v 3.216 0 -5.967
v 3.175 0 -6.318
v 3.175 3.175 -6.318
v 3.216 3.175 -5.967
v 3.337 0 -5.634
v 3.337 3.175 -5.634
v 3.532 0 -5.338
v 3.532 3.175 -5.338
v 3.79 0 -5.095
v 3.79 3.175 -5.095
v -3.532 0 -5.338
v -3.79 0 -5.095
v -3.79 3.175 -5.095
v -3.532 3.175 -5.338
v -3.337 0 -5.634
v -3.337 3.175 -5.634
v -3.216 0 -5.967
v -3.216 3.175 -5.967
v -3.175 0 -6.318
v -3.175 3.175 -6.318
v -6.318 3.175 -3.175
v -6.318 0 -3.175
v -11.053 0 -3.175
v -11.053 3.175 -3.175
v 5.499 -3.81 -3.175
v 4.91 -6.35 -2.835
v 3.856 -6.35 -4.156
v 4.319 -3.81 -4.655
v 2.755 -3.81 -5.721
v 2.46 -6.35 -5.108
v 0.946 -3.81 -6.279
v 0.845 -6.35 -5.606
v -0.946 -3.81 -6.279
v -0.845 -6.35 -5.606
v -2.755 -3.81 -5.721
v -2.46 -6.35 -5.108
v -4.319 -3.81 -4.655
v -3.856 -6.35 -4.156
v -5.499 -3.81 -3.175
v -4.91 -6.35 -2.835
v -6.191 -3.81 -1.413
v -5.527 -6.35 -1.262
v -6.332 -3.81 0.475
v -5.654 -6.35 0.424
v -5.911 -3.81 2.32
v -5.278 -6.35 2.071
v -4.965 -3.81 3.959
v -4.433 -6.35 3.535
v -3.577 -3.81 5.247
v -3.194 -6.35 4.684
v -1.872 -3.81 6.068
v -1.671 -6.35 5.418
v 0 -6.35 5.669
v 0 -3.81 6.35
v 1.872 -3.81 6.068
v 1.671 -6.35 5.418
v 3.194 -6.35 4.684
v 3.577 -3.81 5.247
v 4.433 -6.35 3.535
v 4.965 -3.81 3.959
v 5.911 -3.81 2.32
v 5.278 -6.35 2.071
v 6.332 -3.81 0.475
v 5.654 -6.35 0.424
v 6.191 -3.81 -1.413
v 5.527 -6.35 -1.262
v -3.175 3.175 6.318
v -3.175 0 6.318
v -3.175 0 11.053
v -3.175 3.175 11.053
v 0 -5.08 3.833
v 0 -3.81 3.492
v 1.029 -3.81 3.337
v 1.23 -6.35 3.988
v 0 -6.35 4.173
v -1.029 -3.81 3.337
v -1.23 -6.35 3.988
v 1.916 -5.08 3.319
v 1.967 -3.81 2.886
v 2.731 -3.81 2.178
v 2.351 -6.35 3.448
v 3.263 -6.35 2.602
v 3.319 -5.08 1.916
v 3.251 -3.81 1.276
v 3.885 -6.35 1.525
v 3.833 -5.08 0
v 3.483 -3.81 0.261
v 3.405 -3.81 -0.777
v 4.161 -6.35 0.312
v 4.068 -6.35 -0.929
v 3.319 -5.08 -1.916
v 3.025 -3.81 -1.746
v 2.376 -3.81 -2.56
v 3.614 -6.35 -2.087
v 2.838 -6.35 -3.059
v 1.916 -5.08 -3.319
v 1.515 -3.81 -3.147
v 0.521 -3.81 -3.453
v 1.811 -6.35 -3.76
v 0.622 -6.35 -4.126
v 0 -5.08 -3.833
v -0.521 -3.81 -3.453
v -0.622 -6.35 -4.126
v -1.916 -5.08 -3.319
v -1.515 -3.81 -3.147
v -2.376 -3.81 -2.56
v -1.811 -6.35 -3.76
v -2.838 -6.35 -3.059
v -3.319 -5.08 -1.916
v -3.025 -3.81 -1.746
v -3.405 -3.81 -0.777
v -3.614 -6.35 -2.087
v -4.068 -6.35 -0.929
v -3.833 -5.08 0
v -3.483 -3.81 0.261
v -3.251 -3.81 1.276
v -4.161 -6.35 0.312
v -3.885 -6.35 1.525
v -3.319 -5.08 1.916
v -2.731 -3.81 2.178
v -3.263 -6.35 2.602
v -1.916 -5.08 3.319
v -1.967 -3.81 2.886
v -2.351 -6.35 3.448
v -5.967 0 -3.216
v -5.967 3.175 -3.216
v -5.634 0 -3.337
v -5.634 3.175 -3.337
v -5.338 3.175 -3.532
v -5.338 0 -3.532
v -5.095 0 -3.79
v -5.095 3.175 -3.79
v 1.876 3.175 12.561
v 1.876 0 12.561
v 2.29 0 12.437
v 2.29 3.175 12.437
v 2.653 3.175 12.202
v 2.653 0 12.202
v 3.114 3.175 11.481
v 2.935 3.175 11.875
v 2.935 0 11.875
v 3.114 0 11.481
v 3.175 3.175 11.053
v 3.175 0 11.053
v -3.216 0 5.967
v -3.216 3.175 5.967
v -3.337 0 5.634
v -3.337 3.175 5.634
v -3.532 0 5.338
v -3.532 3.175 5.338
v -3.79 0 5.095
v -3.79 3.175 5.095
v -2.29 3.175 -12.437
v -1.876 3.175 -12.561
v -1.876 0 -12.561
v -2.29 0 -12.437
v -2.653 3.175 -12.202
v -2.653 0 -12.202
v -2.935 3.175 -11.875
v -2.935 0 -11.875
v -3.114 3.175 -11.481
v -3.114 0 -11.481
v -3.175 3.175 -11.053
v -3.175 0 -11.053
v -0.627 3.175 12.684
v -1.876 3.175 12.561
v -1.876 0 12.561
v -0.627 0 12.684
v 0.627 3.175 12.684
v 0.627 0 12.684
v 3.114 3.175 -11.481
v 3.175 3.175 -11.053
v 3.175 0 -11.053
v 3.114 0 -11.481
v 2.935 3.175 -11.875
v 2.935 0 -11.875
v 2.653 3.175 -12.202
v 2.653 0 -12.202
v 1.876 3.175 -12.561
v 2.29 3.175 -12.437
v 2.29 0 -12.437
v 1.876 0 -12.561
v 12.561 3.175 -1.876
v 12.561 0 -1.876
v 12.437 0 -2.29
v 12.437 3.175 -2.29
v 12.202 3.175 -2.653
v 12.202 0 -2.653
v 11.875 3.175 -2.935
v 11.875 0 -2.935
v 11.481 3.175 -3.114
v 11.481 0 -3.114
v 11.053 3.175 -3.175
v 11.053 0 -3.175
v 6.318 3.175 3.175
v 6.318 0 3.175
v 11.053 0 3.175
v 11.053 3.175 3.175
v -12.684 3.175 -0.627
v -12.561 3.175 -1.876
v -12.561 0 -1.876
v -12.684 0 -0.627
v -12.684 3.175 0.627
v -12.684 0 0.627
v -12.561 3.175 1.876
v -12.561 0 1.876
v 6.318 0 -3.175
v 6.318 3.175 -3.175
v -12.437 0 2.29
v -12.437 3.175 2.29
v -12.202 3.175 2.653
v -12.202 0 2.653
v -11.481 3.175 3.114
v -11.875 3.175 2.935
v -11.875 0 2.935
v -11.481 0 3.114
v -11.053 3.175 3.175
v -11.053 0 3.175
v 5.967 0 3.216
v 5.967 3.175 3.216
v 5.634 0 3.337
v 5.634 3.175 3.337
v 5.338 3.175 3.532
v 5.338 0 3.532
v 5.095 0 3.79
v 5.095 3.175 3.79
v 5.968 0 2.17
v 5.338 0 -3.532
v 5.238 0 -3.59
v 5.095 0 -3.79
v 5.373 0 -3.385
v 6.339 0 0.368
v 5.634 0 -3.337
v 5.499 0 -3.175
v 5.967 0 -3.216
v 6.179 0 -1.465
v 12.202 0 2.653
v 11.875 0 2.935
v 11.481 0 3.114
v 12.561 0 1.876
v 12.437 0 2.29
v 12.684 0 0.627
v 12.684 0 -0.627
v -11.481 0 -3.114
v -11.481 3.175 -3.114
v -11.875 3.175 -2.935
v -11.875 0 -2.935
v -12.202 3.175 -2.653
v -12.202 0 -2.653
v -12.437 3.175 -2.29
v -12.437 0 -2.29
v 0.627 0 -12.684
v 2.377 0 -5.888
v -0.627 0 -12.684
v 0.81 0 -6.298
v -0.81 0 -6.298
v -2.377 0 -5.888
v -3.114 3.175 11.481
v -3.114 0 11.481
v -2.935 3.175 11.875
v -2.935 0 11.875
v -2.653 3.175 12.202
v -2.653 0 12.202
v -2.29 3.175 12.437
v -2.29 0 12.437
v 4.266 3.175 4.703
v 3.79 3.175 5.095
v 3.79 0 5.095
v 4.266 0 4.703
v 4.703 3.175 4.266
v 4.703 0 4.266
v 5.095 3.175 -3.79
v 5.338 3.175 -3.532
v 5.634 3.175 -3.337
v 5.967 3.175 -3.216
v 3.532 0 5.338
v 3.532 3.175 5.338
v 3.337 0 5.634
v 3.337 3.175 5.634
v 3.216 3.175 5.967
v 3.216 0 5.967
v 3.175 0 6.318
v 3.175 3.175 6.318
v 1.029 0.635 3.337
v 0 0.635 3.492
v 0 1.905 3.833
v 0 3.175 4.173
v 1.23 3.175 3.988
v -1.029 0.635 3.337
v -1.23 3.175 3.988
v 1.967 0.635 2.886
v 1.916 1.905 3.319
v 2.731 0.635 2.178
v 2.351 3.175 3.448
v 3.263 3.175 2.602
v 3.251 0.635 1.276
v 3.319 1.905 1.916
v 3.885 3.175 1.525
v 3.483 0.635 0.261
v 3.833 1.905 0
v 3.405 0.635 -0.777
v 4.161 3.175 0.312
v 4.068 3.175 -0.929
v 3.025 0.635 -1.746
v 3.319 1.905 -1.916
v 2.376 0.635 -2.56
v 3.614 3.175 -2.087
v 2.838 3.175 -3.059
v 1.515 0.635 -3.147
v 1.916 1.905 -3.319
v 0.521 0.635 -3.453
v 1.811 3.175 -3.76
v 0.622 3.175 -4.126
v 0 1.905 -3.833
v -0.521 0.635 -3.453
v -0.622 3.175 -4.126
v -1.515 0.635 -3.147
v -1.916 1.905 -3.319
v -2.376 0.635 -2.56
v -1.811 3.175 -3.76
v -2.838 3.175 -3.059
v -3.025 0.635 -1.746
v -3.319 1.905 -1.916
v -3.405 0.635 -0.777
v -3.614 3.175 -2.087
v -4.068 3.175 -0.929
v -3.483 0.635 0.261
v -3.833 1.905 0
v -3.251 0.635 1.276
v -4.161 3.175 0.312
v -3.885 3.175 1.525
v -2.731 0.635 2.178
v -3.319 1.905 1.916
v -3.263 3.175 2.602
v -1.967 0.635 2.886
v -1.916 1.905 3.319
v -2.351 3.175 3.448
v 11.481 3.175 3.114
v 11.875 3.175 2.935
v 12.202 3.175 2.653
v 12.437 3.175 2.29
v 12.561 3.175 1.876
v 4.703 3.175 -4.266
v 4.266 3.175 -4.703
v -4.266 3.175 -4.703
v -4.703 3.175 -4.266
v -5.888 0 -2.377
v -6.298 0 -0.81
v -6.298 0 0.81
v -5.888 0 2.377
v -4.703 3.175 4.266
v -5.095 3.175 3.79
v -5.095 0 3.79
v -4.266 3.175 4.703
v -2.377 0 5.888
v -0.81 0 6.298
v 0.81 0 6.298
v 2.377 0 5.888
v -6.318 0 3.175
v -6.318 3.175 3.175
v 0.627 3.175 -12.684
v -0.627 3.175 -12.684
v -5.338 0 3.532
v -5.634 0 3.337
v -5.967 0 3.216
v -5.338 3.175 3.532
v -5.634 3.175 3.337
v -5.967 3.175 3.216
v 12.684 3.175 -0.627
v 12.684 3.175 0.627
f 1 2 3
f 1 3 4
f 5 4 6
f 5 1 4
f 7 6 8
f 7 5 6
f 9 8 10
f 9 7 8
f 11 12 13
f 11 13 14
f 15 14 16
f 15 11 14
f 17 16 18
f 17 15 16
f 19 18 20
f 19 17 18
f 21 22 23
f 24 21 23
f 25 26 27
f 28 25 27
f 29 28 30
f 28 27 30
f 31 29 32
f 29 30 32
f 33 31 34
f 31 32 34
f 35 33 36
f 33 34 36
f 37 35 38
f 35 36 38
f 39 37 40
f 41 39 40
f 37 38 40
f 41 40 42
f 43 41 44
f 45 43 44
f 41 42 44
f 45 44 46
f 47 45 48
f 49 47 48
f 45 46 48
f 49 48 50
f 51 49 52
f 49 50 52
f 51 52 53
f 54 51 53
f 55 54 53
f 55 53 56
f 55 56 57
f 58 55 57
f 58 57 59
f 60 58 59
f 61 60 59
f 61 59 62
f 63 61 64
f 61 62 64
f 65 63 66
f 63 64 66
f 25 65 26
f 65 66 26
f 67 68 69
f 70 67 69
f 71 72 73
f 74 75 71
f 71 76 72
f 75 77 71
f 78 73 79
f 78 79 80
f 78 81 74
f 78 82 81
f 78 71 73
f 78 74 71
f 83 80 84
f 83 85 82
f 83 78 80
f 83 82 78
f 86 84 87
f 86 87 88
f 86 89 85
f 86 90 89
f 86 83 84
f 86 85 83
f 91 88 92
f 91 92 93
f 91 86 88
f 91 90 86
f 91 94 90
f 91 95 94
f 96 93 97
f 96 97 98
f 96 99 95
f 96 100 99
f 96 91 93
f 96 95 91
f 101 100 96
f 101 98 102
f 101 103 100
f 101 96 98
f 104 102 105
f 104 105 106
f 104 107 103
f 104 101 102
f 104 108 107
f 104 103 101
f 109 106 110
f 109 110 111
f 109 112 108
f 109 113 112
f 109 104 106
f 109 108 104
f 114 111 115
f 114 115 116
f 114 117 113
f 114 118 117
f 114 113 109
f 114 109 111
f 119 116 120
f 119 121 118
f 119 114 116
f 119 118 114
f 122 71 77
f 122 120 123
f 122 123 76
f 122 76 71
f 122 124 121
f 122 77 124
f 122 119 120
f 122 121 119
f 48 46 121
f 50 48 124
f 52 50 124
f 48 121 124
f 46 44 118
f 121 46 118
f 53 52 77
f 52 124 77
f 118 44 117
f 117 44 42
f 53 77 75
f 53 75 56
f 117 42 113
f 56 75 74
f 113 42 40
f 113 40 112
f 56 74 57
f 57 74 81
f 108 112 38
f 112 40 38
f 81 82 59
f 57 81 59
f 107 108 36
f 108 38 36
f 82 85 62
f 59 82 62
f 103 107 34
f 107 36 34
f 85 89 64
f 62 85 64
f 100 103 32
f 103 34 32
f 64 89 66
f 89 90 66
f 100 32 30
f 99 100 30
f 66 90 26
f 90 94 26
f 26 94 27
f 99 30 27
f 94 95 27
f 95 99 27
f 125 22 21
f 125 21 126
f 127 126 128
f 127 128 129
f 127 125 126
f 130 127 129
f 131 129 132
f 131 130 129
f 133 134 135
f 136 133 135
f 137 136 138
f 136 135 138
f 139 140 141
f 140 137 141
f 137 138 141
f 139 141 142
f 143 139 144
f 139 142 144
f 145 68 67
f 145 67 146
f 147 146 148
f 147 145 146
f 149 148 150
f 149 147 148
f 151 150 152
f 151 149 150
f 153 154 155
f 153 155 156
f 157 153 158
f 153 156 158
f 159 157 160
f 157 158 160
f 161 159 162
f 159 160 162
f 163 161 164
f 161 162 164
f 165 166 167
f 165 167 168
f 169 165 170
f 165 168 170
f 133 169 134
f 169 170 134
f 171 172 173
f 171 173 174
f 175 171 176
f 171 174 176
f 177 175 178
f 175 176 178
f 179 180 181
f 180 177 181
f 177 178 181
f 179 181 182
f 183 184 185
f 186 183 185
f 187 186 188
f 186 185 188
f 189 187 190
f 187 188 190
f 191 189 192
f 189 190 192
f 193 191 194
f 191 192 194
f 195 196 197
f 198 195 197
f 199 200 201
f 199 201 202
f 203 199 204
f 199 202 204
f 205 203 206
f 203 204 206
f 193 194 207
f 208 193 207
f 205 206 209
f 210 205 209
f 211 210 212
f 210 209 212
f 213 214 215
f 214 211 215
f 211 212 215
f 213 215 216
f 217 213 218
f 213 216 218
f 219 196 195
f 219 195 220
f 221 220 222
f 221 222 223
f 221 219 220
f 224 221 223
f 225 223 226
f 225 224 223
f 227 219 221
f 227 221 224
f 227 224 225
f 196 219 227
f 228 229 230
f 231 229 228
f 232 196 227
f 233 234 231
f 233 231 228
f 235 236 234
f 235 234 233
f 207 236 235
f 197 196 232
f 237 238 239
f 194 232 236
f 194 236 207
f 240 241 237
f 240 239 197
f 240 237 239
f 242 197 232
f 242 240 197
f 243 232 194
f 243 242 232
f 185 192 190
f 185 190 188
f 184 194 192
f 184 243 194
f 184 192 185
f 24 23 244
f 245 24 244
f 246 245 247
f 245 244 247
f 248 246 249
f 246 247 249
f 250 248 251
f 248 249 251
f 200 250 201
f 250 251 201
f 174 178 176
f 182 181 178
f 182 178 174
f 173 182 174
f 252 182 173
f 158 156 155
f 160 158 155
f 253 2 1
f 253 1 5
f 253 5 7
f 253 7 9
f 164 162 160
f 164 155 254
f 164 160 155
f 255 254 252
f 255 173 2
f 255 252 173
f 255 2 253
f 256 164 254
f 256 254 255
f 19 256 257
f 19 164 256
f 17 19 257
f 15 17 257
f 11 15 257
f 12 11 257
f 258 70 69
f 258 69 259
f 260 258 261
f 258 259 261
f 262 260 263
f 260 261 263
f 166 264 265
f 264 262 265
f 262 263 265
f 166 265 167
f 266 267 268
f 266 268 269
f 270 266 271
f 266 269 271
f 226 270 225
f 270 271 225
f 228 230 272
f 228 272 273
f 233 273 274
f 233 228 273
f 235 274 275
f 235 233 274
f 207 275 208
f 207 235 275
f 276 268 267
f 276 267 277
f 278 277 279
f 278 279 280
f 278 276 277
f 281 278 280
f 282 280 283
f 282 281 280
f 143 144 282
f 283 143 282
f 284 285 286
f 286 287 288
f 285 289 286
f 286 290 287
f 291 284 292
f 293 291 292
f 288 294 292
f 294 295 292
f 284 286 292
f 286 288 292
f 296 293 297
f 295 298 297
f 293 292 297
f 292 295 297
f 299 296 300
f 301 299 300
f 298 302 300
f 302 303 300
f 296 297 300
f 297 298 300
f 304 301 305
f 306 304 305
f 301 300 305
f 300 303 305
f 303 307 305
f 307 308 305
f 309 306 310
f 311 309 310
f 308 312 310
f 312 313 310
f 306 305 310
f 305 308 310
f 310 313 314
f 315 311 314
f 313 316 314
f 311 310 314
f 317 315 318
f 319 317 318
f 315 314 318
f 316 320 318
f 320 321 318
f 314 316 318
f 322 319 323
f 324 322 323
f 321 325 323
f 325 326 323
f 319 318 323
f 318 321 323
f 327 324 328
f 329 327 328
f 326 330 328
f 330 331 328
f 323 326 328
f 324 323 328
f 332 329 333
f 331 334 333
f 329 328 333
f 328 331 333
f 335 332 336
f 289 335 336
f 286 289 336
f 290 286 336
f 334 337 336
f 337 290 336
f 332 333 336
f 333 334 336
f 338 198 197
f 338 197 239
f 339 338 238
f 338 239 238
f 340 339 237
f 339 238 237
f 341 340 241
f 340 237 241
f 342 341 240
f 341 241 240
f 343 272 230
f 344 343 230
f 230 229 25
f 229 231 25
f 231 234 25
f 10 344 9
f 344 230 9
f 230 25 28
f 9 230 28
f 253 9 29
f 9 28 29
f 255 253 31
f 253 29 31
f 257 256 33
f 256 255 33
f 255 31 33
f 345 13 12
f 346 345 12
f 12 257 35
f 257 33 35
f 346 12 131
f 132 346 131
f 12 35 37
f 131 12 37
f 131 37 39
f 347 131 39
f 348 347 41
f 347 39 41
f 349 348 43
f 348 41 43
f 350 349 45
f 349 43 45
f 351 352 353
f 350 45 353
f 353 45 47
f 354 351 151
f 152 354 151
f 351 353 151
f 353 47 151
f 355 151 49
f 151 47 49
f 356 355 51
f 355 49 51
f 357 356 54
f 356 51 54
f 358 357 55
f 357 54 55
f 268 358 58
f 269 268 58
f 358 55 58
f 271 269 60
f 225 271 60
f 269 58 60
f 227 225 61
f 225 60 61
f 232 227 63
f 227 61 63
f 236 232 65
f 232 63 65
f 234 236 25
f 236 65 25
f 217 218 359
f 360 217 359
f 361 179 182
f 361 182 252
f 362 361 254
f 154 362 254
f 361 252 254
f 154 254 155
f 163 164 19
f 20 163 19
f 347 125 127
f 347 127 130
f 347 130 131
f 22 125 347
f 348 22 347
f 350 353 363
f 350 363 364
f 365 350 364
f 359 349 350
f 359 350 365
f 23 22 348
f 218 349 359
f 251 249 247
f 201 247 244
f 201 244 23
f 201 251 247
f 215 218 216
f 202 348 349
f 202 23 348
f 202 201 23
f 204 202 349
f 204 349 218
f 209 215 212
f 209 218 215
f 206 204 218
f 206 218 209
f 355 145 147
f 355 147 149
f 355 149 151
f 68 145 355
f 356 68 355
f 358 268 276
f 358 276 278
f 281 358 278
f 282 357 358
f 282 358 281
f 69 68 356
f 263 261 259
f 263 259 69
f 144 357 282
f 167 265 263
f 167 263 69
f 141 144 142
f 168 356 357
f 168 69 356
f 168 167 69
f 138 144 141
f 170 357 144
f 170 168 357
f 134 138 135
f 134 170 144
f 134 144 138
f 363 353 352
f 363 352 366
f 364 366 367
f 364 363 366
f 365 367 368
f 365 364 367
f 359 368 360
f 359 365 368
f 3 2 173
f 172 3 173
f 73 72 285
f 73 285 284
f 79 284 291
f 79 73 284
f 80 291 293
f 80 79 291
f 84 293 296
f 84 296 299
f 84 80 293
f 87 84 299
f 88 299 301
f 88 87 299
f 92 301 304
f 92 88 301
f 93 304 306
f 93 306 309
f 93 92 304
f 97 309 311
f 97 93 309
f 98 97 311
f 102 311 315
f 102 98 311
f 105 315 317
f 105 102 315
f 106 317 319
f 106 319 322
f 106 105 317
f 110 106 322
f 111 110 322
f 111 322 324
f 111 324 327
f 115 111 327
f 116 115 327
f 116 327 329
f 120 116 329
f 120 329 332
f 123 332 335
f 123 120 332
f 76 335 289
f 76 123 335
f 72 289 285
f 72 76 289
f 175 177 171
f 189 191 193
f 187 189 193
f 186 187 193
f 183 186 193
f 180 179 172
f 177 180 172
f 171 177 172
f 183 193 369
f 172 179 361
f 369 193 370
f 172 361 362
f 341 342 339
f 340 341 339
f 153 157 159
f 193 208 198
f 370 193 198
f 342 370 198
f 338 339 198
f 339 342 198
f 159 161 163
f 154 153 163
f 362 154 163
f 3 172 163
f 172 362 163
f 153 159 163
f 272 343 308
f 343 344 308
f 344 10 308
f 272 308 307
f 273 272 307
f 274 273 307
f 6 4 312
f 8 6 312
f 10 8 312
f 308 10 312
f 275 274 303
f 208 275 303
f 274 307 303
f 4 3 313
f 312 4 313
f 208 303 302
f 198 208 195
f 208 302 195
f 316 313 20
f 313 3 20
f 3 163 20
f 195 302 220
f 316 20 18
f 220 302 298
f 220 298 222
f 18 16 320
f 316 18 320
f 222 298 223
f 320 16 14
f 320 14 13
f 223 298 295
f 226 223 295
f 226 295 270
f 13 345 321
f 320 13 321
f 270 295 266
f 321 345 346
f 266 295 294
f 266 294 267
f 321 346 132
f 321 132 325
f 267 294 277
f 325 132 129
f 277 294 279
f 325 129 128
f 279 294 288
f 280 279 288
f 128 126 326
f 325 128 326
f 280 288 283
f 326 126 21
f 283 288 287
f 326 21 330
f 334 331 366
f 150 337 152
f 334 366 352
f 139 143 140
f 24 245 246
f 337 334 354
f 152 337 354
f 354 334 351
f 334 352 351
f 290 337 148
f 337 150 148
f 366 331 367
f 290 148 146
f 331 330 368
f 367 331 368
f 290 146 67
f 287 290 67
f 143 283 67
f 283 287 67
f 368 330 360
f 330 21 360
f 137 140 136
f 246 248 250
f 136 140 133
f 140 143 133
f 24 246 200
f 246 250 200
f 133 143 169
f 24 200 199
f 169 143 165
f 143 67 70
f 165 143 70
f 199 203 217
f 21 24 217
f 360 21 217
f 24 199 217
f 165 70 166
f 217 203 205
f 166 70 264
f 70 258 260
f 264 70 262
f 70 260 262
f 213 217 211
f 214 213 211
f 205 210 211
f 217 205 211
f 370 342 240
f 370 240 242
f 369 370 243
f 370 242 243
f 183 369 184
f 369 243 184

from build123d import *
from OCP.BRepFilletAPI import BRepFilletAPI_MakeChamfer

# Parameters (mm, degrees)
SKETCH1_R           = 3.492500000000002
BOSS_EXTRUDE1_DEPTH = 3.175
BOSS_EXTRUDE2_START = -6.35
SKETCH1_3_R         = 3.4925
BOSS_EXTRUDE2_DEPTH = 6.35
CHAMFER1_SIZE       = 2.54
CHAMFER1_SIZE2      = 0.6805909487750533
FILLET2_R           = 1.524


with BuildPart() as part:
    # Sketch1 → Boss-Extrude1 (new body)
    with BuildSketch(Plane(origin=(0, 0, 0), x_dir=(1, 0, 0), z_dir=(0, 1, 0))):
        with BuildLine():
            ThreePointArc((-3.1750000000000007, 5.499261314031186), (-4.490128060534577, 4.490128060534578), (-5.499261314031186, 3.1750000000000016))
            Line((-5.499261314031183, 3.1750000000000007), (-12.296722124208548, 3.1750000000000034))
            ThreePointArc((-12.296722124208548, 3.175000000000004), (-12.700000000000001, 1.56e-15), (-12.29672212420855, -3.175000000000001))
            Line((-12.296722124208545, -3.1750000000000003), (-5.499261314031183, -3.175000000000001))
            ThreePointArc((-5.499261314031185, -3.175000000000003), (-4.490128060534575, -4.490128060534579), (-3.174999999999998, -5.499261314031186))
            Line((-3.174999999999998, -5.499261314031185), (-3.1749999999999976, -12.296722124208545))
            ThreePointArc((-3.1750000000000047, -12.296722124208548), (-2.33e-15, -12.700000000000001), (3.175, -12.29672212420855))
            Line((3.175000000000002, -12.296722124208543), (3.175000000000001, -5.499261314031185))
            ThreePointArc((3.175, -5.499261314031186), (4.490128060534578, -4.490128060534577), (5.499261314031187, -3.1749999999999994))
            Line((5.499261314031186, -3.1749999999999985), (12.296722124208548, -3.1749999999999954))
            ThreePointArc((12.296722124208552, -3.174999999999996), (12.700000000000003, 4.44e-15), (12.296722124208548, 3.1750000000000043))
            Line((12.296722124208546, 3.1750000000000043), (5.499261314031185, 3.1750000000000007))
            ThreePointArc((5.499261314031187, 3.175), (4.490128060534579, 4.490128060534575), (3.1749999999999994, 5.499261314031187))
            Line((3.1749999999999994, 5.499261314031186), (3.175, 12.296722124208548))
            ThreePointArc((3.1750000000000003, 12.29672212420855), (8.9e-16, 12.700000000000001), (-3.1749999999999985, 12.29672212420855))
            Line((-3.1749999999999994, 12.29672212420855), (-3.175, 5.499261314031185))
        make_face()
        with Locations(Location((-1.22e-15, -1.22e-15, 0), (0, 0, 270))):
            Circle(SKETCH1_R, mode=Mode.SUBTRACT)
    extrude(amount=BOSS_EXTRUDE1_DEPTH)

    # Sketch1<3> → Boss-Extrude2 (add)
    with BuildSketch(Plane(origin=(0, 0, 0), x_dir=(1, 0, 0), z_dir=(0, 1, 0)).offset(BOSS_EXTRUDE2_START)):
        with BuildLine():
            ThreePointArc((3.174999999999999, 5.499261314031186), (-1.02e-15, 6.35), (-3.175000000000001, 5.499261314031184))
            ThreePointArc((-3.175000000000001, 5.499261314031184), (-4.490128060534576, 4.490128060534577), (-5.499261314031184, 3.175000000000002))
            ThreePointArc((-5.499261314031184, 3.175000000000002), (-6.35, 7.8e-16), (-5.499261314031185, -3.1750000000000007))
            ThreePointArc((-5.499261314031185, -3.1750000000000007), (-4.490128060534575, -4.490128060534578), (-3.174999999999997, -5.499261314031187))
            ThreePointArc((-3.174999999999997, -5.499261314031187), (-1.17e-15, -6.35), (3.1750000000000007, -5.499261314031185))
            ThreePointArc((3.1750000000000007, -5.499261314031185), (4.4901280605345795, -4.490128060534573), (5.499261314031187, -3.1749999999999976))
            ThreePointArc((5.499261314031187, -3.1749999999999976), (6.133628996935584, -1.6435009364010063), (6.35, -1.56e-15))
            ThreePointArc((6.35, 0), (6.133628996935584, 1.6435009364010074), (5.499261314031185, 3.1750000000000007))
            ThreePointArc((5.499261314031185, 3.1750000000000007), (4.490128060534575, 4.490128060534578), (3.174999999999999, 5.499261314031186))
        make_face()
        with Locations(Location((0, 0, 0), (0, 0, 270))):
            Circle(SKETCH1_3_R, mode=Mode.SUBTRACT)
    extrude(amount=BOSS_EXTRUDE2_DEPTH)

    # Chamfer1: one chamfer whose edges measure the first distance from different faces: ONE call of the kernel's chamfer builder (chamfer() names one face for all edges)
    chamfer1_edges_1 = [part.edges().sort_by_distance(p)[0] for p in [
        (3.174999999999999, -6.35, -5.499261314031194),
    ]]
    chamfer1_side_1 = [part.faces().sort_by_distance(p)[0] for p in [
        (3.1749999999999865, -3.175, -5.499261314031195),
    ]]
    chamfer1_edges_2 = [part.edges().sort_by_distance(p)[0] for p in [
        (1.07e-15, -6.35, -3.4925),
    ]]
    chamfer1_side_2 = [part.faces().sort_by_distance(p)[0] for p in [
        (1.07e-15, -3.175, -3.4925),
    ]]
    chamfer1_edges_3 = [part.edges().sort_by_distance(p)[0] for p in [
        (-1.5e-16, 3.175, -3.4925000000000006),
    ]]
    chamfer1_side_3 = [part.faces().sort_by_distance(p)[0] for p in [
        (-1.5e-16, 1.5875, -3.4925000000000006),
    ]]
    chamfer1 = BRepFilletAPI_MakeChamfer(part.part.solid().wrapped)
    for e in chamfer1_edges_1:
        chamfer1.Add(CHAMFER1_SIZE, CHAMFER1_SIZE2, e.wrapped, chamfer1_side_1[0].wrapped)  # the first distance lies on this face
    for e in chamfer1_edges_2:
        chamfer1.Add(CHAMFER1_SIZE, CHAMFER1_SIZE2, e.wrapped, chamfer1_side_2[0].wrapped)  # the first distance lies on this face
    for e in chamfer1_edges_3:
        chamfer1.Add(CHAMFER1_SIZE, CHAMFER1_SIZE2, e.wrapped, chamfer1_side_3[0].wrapped)  # the first distance lies on this face
    add(Compound.cast(chamfer1.Shape()), mode=Mode.REPLACE)

    # Fillet2
    # the kernel refuses this fillet: 1.524 mm, written as the material it adds along each edge
    with BuildSketch(Plane(origin=(3.174999999999999, 0, -5.499261314031187), x_dir=(0.8356194334098631, 0, 0.5493088043239243), z_dir=(0, 1, 0))) as fillet2_piece_1:
        with BuildLine():
            CenterArc((0.8236501414377054, 1.5214428185116744), FILLET2_R, 213.3196069721482, 53.36078605570344)
            Line((-0.44983387507892547, 0.684296200722013), (0, 0))
            ThreePointArc((0, 0), (0.36770095599897257, 0.01065492286802295), (0.7354019119979484, -1e-17))
        make_face()
    extrude(amount=3.175)
    with BuildSketch(Plane(origin=(5.499261314031186, 0, -3.1750000000000007), x_dir=(1, 0, -1.08e-15), z_dir=(0, 1, 0))) as fillet2_piece_2:
        with BuildLine():
            CenterArc((0.8189089115958533, 1.524), FILLET2_R, 216.63921394429647, 53.3607860557035)
            ThreePointArc((-0.40396274497712104, 0.6145161290322583), (-0.19307791187855783, 0.31311090745692627), (0, 0))
            Line((0, 0), (0.8189089115958526, 0))
        make_face()
    extrude(amount=3.175)
    with BuildSketch(Plane(origin=(5.499261314031186, 0, 3.174999999999999), x_dir=(-0.5493088043239248, 0, 0.8356194334098627), z_dir=(0, 1, 0))) as fillet2_piece_3:
        with BuildLine():
            CenterArc((0.8236501414377031, 1.521442818511675), FILLET2_R, 213.31960697214825, 53.3607860557035)
            Line((-0.44983387507892714, 0.6842962007220129), (0, 0))
            ThreePointArc((0, 0), (0.3677009559989749, 0.01065492286802371), (0.7354019119979491, 1e-17))
        make_face()
    extrude(amount=3.175)
    with BuildSketch(Plane(origin=(3.1750000000000007, 0, 5.499261314031186), x_dir=(1.08e-15, 0, 1), z_dir=(0, 1, 0))) as fillet2_piece_4:
        with BuildLine():
            CenterArc((0.8189089115958524, 1.524), FILLET2_R, 216.63921394429642, 53.36078605570356)
            ThreePointArc((-0.4039627449771237, 0.61451612903226), (-0.19307791187855872, 0.3131109074569276), (0, 0))
            Line((0, 0), (0.8189089115958508, 0))
        make_face()
    extrude(amount=3.175)
    with BuildSketch(Plane(origin=(-3.1749999999999976, 0, 5.499261314031186), x_dir=(-0.8356194334098629, 0, -0.5493088043239246), z_dir=(0, 1, 0))) as fillet2_piece_5:
        with BuildLine():
            CenterArc((0.8236501414377089, 1.5214428185116742), FILLET2_R, 213.3196069721482, 53.3607860557035)
            Line((-0.44983387507892214, 0.684296200722013), (0, 0))
            ThreePointArc((0, 0), (0.3677009559989767, 0.0106549228680226), (0.7354019119979527, 1e-17))
        make_face()
    extrude(amount=3.175)
    with BuildSketch(Plane(origin=(-5.499261314031184, 0, 3.1750000000000025), x_dir=(-1, 0, -1.08e-15), z_dir=(0, 1, 0))) as fillet2_piece_6:
        with BuildLine():
            CenterArc((0.81890891159585, 1.524), FILLET2_R, 216.6392139442966, 53.36078605570344)
            ThreePointArc((-0.40396274497712237, 0.6145161290322556), (-0.1930779118785585, 0.31311090745692494), (0, 0))
            Line((0, 0), (0.8189089115958517, 0))
        make_face()
    extrude(amount=3.175)
    with BuildSketch(Plane(origin=(-5.499261314031185, 0, -3.1750000000000016), x_dir=(0.5493088043239243, 0, -0.835619433409863), z_dir=(0, 1, 0))) as fillet2_piece_7:
        with BuildLine():
            CenterArc((0.8236501414377072, 1.5214428185116744), FILLET2_R, 213.31960697214814, 53.3607860557035)
            Line((-0.44983387507892447, 0.6842962007220147), (0, 0))
            ThreePointArc((0, 0), (0.3677009559989745, 0.01065492286802321), (0.7354019119979499, -1e-17))
        make_face()
    extrude(amount=3.175)
    with BuildSketch(Plane(origin=(-3.1750000000000007, 0, -5.499261314031186), x_dir=(1.08e-15, 0, -1), z_dir=(0, 1, 0))) as fillet2_piece_8:
        with BuildLine():
            CenterArc((0.8189089115958518, 1.524), FILLET2_R, 216.63921394429659, 53.3607860557035)
            ThreePointArc((-0.4039627449771215, 0.614516129032256), (-0.19307791187855938, 0.3131109074569254), (0, 0))
            Line((0, 0), (0.8189089115958534, 0))
        make_face()
    extrude(amount=3.175)
    # the kernel refuses this fillet: 1.524 mm, written as the material it takes off along each edge
    with BuildSketch(Plane(origin=(3.175, -3.313522044377113, -12.29672212420855), x_dir=(-0.9799720802882134, 0, -0.1991349337901098), z_dir=(0, 1, 0))) as fillet2_2_piece_1:
        with BuildLine():
            CenterArc((1.2458842886857948, 1.5219237330684425), FILLET2_R, 191.48637688209308, 81.5047584217437)
            Line((-0.24759316167344236, 1.218442093972315), (0, 0))
            ThreePointArc((0, 0), (0.662704408875422, -0.01730222442965028), (1.325408817750845, 1e-17))
        make_face()
    extrude(amount=9.802044088754226, mode=Mode.SUBTRACT)
    with BuildSketch(Plane(origin=(12.29672212420855, -3.313522044377107, -3.175000000000003), x_dir=(0.1991349337901089, 0, 0.9799720802882137), z_dir=(0, 1, 0))) as fillet2_2_piece_2:
        with BuildLine():
            CenterArc((1.2458842886857953, -1.521923733068443), FILLET2_R, 87.00886469616333, 81.50475842174347)
            Line((-0.24759316167344145, -1.218442093972312), (0, 0))
            ThreePointArc((0, 0), (0.6627044088754213, 0.01730222442965107), (1.3254088177508423, 1e-17))
        make_face()
    extrude(amount=9.802044088754215, mode=Mode.SUBTRACT)
    with BuildSketch(Plane(origin=(12.29672212420855, -3.3135220443771116, 3.1749999999999954), x_dir=(0.19913493379011118, 0, -0.979972080288213), z_dir=(0, 1, 0))) as fillet2_2_piece_3:
        with BuildLine():
            CenterArc((1.2458842886857922, 1.5219237330684423), FILLET2_R, 191.48637688209323, 81.50475842174365)
            Line((-0.24759316167344428, 1.218442093972311), (0, 0))
            ThreePointArc((0, 0), (0.6627044088754224, -0.0173022244296529), (1.3254088177508445, -3e-17))
        make_face()
    extrude(amount=9.802044088754222, mode=Mode.SUBTRACT)
    with BuildSketch(Plane(origin=(3.175000000000002, -3.3135220443771143, 12.296722124208548), x_dir=(0, 0, -1), z_dir=(0, 1, 0))) as fillet2_2_piece_4:
        with BuildLine():
            CenterArc((1.2433436813975014, 1.524), FILLET2_R, 188.4952415782562, 81.50475842174376)
            ThreePointArc((-0.26393519716764224, 1.2988636363636379), (-0.14892329545176253, 0.6459863408655986), (0, 0))
            Line((0, 0), (1.2433436813975014, 0))
        make_face()
    extrude(amount=9.80204408875423, mode=Mode.SUBTRACT)
    with BuildSketch(Plane(origin=(-3.1749999999999976, -3.3135220443771236, 12.29672212420855), x_dir=(0.9799720802882134, 0, 0.1991349337901098), z_dir=(0, 1, 0))) as fillet2_2_piece_5:
        with BuildLine():
            CenterArc((1.2458842886857944, 1.5219237330684423), FILLET2_R, 191.48637688209308, 81.50475842174376)
            Line((-0.2475931616734428, 1.218442093972315), (0, 0))
            ThreePointArc((0, 0), (0.6627044088754224, -0.01730222442965202), (1.325408817750845, 1e-17))
        make_face()
    extrude(amount=9.802044088754247, mode=Mode.SUBTRACT)
    with BuildSketch(Plane(origin=(-12.29672212420855, -3.313522044377118, 3.1750000000000003), x_dir=(1, 0, 0), z_dir=(0, 1, 0))) as fillet2_2_piece_6:
        with BuildLine():
            CenterArc((1.2433436813975014, 1.524), FILLET2_R, 188.4952415782562, 81.50475842174376)
            ThreePointArc((-0.26393519716764224, 1.298863636363638), (-0.1489232954517643, 0.6459863408655999), (0, 0))
            Line((0, 0), (1.2433436813975014, 0))
        make_face()
    extrude(amount=9.802044088754236, mode=Mode.SUBTRACT)
    with BuildSketch(Plane(origin=(-12.29672212420855, -3.313522044377115, -3.1750000000000034), x_dir=(-0.1991349337901111, 0, 0.9799720802882133), z_dir=(0, 1, 0))) as fillet2_2_piece_7:
        with BuildLine():
            CenterArc((1.2458842886857935, 1.5219237330684425), FILLET2_R, 191.4863768820932, 81.50475842174365)
            Line((-0.24759316167344286, 1.2184420939723115), (0, 0))
            ThreePointArc((0, 0), (0.662704408875423, -0.01730222442965109), (1.3254088177508456, -2e-17))
        make_face()
    extrude(amount=9.802044088754231, mode=Mode.SUBTRACT)
    with BuildSketch(Plane(origin=(-3.1749999999999994, -3.3135220443771085, -12.296722124208546), x_dir=(0, 0, 1), z_dir=(0, 1, 0))) as fillet2_2_piece_8:
        with BuildLine():
            CenterArc((1.2433436813974978, 1.524), FILLET2_R, 188.4952415782563, 81.5047584217437)
            ThreePointArc((-0.2639351971676458, 1.2988636363636357), (-0.1489232954517643, 0.6459863408655977), (0, 0))
            Line((0, 0), (1.2433436813974978, 0))
        make_face()
    extrude(amount=9.802044088754217, mode=Mode.SUBTRACT)


solid = part.part
